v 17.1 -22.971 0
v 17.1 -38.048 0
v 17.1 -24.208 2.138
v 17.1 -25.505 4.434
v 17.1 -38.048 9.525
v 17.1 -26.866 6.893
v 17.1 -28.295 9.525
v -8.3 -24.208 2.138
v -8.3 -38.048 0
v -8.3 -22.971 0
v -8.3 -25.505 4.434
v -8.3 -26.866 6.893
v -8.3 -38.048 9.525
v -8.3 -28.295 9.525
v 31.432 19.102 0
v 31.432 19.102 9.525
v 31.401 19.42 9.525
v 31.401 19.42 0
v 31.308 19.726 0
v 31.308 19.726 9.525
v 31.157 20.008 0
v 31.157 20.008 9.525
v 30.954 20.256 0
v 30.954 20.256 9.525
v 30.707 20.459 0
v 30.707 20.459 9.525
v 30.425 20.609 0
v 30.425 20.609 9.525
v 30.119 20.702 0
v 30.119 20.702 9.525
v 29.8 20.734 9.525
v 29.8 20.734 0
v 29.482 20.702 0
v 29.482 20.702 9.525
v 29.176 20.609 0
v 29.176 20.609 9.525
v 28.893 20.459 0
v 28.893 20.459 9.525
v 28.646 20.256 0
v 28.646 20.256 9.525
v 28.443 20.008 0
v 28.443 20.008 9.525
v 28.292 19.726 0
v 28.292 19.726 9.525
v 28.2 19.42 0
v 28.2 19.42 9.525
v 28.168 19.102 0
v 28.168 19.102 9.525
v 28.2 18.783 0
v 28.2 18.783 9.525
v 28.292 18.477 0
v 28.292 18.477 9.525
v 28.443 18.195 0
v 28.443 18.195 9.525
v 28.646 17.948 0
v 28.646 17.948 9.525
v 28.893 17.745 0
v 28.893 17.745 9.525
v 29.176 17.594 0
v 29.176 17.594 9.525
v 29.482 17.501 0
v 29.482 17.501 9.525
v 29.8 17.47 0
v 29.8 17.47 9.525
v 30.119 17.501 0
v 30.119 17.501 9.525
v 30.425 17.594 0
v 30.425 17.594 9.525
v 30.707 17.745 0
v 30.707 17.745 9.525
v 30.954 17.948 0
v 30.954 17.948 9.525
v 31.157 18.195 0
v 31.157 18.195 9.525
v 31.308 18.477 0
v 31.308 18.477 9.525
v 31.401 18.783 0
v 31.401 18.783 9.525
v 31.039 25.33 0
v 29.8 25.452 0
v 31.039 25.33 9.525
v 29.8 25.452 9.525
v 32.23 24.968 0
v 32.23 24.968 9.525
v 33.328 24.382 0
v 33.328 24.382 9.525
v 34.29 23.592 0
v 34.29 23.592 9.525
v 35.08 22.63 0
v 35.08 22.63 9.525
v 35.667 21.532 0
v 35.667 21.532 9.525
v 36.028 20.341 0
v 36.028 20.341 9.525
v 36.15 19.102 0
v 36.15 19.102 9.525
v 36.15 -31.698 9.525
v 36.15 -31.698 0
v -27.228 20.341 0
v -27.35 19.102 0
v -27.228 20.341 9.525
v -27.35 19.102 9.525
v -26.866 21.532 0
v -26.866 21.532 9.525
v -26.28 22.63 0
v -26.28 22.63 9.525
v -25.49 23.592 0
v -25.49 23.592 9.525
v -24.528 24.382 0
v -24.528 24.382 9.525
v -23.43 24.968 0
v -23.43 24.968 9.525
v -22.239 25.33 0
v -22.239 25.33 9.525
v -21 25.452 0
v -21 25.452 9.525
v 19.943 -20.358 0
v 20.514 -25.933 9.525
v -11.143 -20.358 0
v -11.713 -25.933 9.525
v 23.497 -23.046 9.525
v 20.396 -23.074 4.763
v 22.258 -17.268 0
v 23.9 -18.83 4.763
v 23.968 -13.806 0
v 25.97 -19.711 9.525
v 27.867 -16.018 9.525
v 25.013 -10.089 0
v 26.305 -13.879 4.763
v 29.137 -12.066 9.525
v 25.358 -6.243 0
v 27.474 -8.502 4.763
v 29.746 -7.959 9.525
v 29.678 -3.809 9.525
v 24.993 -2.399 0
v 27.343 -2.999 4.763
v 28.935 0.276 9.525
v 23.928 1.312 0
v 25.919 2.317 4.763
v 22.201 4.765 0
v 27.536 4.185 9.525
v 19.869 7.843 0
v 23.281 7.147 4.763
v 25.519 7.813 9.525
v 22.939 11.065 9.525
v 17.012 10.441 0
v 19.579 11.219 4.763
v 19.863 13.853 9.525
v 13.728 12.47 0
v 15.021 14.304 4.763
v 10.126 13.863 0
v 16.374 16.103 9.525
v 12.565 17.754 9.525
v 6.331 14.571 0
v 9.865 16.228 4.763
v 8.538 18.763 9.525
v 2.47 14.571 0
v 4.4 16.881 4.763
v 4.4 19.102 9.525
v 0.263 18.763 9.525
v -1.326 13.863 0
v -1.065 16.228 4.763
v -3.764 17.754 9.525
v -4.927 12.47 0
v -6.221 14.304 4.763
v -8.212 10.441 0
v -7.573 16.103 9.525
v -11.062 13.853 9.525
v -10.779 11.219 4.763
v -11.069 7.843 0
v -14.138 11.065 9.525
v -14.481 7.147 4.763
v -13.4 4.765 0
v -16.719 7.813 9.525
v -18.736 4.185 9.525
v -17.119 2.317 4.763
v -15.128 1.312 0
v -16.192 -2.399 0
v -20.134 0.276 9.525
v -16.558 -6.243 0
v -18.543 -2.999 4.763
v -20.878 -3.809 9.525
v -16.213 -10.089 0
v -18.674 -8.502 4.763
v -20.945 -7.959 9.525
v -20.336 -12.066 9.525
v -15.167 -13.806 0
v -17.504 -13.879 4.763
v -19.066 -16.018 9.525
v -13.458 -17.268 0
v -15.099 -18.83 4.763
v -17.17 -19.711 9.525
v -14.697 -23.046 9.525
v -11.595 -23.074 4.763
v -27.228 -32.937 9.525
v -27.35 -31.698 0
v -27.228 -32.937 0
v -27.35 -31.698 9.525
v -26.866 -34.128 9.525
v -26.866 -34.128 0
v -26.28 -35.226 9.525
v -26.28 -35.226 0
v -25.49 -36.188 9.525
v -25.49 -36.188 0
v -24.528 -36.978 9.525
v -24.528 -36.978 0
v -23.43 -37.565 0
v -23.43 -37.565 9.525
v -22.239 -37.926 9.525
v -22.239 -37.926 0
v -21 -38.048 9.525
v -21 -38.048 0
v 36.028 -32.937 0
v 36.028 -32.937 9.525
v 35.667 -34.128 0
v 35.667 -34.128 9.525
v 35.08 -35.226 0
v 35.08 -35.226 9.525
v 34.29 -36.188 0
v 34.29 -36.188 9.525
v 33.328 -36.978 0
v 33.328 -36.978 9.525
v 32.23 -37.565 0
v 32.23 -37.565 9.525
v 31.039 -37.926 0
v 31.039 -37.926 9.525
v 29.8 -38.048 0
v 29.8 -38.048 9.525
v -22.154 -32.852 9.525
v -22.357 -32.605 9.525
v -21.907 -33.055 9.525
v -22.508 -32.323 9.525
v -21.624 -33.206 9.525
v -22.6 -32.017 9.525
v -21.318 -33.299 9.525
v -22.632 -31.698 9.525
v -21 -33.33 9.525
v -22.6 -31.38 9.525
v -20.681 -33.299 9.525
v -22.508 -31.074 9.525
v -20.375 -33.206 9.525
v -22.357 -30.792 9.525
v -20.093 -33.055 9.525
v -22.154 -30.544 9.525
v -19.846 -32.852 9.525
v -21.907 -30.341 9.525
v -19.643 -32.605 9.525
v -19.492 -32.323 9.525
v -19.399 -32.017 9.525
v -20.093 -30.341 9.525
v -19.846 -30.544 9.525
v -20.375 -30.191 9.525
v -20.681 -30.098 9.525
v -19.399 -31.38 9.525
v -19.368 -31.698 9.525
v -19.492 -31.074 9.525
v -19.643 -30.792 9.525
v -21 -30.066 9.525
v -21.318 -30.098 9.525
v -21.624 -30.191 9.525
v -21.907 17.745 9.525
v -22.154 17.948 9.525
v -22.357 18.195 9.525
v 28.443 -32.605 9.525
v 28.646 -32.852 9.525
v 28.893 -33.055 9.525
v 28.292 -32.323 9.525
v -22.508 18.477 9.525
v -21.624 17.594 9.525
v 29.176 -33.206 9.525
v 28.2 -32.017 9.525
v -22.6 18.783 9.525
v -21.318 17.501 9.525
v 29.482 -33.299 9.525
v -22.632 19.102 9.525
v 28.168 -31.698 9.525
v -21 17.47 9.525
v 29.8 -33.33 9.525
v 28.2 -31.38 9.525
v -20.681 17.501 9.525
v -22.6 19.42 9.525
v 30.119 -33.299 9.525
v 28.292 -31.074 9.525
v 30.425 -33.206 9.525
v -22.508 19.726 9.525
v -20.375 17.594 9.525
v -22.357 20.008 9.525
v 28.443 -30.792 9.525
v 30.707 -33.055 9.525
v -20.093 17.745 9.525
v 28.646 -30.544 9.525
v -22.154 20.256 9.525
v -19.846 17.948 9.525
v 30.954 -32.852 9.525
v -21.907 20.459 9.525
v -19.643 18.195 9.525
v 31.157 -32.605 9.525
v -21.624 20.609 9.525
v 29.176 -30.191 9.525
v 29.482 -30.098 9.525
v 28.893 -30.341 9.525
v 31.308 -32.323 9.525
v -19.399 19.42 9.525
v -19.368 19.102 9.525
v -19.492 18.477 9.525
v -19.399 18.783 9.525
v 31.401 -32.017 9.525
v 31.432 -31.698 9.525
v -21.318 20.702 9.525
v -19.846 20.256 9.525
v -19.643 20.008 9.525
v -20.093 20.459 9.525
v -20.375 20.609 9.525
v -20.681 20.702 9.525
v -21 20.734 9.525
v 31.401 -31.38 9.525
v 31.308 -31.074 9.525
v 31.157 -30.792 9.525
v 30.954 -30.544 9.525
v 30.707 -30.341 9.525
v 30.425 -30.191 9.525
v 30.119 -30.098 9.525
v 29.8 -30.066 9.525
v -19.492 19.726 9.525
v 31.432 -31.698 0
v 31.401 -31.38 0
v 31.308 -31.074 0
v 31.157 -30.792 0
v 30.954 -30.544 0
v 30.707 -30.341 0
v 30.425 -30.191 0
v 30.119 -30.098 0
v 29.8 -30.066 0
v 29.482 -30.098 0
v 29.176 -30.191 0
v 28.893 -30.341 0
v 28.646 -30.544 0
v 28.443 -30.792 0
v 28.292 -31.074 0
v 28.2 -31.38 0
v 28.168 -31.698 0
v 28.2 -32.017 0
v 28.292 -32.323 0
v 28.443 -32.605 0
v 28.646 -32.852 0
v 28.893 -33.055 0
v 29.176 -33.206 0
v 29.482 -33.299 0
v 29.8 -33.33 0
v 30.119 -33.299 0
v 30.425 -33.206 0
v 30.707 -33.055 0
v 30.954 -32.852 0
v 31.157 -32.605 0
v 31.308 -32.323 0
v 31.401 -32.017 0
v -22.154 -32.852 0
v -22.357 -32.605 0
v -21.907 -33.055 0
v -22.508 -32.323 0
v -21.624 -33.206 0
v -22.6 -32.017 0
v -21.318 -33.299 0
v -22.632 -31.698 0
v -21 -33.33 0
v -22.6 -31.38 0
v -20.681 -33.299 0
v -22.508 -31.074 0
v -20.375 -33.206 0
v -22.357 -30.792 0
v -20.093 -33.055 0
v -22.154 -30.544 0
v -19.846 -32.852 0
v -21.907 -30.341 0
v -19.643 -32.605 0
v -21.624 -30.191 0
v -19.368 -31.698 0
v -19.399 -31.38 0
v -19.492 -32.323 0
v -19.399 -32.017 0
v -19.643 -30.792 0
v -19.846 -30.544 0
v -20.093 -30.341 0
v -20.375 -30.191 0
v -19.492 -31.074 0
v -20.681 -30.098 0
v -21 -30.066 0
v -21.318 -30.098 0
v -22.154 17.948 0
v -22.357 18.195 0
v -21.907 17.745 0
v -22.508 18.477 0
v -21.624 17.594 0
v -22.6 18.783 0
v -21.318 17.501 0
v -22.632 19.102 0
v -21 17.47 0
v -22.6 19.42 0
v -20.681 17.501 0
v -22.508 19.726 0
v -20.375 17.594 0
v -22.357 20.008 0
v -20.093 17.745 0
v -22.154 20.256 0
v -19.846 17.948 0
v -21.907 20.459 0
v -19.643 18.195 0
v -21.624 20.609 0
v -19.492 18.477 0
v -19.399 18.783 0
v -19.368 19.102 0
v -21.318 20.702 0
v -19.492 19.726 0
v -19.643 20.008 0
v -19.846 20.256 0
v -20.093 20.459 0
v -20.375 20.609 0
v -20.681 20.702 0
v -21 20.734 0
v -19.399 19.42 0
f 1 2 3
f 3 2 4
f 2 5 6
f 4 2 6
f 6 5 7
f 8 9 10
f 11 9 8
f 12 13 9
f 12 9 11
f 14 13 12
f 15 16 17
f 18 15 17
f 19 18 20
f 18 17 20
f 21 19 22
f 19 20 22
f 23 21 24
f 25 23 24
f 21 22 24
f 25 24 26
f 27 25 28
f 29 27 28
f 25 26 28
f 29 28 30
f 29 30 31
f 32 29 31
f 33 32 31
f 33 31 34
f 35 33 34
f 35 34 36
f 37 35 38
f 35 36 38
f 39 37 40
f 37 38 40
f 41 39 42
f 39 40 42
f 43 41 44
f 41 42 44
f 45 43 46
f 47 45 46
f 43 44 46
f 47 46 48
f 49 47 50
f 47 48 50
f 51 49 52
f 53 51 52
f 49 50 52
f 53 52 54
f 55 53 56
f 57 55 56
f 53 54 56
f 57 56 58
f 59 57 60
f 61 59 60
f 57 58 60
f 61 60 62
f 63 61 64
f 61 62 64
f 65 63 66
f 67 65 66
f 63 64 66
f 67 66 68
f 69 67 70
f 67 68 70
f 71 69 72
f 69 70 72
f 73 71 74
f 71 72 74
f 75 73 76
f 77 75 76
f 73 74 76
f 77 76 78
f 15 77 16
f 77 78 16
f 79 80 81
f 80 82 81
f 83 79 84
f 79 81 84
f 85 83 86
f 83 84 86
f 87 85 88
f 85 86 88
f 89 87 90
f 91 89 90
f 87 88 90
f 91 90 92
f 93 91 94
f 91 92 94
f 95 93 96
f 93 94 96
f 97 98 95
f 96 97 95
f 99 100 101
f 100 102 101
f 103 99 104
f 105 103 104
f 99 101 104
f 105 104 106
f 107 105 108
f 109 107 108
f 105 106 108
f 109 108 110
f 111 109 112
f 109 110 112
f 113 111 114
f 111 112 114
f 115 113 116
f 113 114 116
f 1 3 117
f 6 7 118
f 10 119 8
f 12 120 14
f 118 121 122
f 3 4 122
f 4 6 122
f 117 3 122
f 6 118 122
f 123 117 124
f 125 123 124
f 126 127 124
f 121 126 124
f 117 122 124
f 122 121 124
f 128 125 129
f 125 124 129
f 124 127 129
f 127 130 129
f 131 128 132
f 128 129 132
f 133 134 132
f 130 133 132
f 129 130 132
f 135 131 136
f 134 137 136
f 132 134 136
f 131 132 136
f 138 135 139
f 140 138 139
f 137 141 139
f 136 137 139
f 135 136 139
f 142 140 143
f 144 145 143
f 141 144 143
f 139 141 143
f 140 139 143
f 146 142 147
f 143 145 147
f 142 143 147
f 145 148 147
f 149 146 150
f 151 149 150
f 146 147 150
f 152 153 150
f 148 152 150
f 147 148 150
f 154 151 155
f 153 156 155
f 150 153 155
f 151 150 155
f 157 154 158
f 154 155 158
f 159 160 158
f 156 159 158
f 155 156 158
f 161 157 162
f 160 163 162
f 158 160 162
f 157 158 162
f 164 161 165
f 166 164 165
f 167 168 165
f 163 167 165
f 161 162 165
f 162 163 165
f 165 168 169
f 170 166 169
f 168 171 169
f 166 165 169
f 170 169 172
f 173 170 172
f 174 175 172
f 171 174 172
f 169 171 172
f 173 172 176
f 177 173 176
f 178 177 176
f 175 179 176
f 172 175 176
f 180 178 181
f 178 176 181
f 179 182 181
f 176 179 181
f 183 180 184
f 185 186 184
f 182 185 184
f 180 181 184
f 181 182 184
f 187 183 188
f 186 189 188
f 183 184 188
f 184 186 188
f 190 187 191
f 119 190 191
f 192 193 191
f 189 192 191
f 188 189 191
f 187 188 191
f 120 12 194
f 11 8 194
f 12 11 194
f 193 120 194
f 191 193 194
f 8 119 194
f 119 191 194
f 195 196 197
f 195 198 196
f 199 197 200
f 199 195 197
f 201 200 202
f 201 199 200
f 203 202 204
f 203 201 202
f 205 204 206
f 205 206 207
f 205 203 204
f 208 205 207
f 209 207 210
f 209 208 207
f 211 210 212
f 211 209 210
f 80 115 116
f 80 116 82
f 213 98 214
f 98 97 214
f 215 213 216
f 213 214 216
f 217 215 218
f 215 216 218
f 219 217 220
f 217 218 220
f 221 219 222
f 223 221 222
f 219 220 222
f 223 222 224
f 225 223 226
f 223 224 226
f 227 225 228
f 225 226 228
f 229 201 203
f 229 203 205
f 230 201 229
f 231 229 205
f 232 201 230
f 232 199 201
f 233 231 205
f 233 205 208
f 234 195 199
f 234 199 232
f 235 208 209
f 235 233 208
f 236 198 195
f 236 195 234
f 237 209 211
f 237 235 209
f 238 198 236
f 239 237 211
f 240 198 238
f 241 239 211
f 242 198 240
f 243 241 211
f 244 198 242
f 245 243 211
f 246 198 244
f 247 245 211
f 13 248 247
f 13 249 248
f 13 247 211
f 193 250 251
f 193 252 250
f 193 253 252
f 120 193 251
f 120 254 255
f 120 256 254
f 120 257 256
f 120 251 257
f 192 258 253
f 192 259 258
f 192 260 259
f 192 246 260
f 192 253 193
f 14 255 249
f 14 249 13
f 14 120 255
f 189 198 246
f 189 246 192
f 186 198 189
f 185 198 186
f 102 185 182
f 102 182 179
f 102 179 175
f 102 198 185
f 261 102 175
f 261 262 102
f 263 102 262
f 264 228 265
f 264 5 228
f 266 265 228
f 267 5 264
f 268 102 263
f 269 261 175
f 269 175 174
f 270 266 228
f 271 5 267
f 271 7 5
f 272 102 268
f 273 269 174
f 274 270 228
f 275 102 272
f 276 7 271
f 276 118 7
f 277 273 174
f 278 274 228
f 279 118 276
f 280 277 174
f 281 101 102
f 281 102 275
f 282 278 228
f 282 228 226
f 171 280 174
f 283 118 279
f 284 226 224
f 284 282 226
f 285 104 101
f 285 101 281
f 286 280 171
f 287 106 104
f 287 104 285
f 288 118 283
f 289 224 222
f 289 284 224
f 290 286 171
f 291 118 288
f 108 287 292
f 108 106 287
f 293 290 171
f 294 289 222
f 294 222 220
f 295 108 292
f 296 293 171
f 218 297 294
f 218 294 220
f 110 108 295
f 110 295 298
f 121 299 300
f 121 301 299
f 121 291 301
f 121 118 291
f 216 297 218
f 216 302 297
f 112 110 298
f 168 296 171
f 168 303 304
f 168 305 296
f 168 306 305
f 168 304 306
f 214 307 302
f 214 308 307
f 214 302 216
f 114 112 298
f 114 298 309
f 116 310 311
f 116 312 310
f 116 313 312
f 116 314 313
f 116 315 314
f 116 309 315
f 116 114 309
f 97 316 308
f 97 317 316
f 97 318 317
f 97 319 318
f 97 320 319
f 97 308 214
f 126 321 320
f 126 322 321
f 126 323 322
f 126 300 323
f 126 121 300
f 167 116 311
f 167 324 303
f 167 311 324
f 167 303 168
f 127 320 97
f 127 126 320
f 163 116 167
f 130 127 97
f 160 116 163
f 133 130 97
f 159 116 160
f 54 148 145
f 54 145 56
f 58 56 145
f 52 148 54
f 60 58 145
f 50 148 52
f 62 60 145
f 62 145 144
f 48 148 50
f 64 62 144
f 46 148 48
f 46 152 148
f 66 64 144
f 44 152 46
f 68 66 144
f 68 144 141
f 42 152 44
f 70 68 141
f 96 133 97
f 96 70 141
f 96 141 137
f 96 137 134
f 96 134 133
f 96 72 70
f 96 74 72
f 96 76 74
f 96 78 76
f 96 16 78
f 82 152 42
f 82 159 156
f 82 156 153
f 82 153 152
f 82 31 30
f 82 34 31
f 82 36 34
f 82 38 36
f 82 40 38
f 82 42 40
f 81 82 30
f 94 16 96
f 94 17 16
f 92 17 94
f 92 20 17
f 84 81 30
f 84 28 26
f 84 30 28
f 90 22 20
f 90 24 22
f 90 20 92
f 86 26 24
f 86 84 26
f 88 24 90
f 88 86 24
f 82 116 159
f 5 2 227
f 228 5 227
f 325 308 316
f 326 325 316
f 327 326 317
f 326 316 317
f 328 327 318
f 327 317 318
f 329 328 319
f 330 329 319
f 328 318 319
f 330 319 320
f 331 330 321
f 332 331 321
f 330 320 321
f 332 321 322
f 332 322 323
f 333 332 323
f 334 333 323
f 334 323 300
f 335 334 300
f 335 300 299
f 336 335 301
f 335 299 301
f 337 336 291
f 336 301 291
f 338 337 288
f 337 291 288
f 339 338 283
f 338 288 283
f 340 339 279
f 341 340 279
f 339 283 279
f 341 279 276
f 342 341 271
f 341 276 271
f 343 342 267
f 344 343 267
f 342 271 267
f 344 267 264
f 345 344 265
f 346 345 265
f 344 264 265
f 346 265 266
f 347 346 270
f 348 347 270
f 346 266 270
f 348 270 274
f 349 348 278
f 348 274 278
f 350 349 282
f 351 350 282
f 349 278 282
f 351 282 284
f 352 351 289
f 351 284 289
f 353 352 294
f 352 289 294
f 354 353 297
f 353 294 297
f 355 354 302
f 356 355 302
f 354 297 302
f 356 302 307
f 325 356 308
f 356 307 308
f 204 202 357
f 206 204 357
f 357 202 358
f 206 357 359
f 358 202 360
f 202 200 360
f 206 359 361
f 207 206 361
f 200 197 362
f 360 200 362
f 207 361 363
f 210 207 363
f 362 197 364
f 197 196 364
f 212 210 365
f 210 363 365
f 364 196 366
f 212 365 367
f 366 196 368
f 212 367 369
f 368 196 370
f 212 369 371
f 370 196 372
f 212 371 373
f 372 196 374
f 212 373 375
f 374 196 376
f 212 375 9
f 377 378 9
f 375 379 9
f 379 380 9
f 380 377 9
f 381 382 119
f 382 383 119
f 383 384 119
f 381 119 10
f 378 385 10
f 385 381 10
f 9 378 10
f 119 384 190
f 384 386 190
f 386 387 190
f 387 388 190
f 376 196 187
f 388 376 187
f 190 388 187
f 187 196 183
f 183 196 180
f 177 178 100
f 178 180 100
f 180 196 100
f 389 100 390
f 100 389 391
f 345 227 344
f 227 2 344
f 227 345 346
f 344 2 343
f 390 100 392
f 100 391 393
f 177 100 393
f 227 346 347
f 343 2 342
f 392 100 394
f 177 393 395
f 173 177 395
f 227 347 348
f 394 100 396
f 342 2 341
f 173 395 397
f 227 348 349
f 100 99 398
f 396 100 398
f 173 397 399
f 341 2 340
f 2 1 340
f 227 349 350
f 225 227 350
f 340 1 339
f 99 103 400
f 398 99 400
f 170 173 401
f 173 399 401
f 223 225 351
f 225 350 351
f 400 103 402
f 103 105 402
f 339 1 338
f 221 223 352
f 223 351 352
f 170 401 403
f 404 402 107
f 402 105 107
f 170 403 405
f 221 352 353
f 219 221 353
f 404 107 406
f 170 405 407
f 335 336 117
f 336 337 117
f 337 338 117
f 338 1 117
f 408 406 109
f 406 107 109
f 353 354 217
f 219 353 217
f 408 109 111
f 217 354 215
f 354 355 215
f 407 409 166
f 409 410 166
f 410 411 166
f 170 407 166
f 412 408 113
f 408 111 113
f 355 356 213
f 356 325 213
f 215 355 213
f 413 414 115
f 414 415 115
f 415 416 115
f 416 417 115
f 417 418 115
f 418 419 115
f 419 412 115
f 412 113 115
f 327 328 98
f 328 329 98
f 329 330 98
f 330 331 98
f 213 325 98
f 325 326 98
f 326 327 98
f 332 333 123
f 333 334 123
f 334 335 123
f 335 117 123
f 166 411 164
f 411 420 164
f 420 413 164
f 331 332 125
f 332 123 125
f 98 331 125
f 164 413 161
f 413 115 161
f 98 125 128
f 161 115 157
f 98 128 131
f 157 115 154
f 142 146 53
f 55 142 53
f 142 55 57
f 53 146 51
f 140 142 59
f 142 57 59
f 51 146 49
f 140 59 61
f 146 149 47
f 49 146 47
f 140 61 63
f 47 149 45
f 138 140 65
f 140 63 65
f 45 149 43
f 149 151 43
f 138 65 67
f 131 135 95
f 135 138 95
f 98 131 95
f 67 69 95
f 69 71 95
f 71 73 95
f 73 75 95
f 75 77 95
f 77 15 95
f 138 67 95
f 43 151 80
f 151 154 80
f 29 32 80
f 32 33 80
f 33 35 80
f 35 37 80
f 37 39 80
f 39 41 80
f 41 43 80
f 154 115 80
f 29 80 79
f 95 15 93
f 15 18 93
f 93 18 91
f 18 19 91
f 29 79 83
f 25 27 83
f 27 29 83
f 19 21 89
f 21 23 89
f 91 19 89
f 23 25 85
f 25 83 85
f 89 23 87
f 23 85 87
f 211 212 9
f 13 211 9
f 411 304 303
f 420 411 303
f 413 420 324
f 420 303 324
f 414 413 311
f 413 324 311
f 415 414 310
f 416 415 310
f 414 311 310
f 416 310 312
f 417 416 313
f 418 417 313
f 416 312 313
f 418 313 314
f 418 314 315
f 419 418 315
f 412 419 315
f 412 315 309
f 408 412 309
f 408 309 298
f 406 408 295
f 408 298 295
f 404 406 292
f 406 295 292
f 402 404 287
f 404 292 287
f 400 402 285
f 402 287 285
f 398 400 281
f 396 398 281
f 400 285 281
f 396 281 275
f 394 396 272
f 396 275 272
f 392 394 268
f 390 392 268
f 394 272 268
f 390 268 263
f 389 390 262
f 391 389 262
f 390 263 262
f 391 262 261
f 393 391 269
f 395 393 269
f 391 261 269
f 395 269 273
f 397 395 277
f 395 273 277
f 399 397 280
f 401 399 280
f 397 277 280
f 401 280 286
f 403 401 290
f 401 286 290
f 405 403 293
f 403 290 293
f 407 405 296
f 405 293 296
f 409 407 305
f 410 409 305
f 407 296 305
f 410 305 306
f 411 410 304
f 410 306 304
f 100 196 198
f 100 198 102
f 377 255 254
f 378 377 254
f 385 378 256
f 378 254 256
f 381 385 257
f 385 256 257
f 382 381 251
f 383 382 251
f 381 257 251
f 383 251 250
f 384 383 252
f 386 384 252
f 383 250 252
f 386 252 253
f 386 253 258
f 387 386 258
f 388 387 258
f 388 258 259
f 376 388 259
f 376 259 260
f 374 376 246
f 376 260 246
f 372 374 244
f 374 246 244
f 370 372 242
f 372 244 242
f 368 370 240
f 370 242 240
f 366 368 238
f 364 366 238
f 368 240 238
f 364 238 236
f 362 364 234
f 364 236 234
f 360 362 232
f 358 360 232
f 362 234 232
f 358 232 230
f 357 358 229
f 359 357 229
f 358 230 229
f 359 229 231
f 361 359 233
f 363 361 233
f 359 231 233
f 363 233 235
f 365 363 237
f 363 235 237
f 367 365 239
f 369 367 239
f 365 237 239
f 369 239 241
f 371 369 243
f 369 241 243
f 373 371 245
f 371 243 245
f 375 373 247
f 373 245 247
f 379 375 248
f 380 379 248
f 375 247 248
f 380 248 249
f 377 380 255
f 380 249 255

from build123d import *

# Parameters (mm, degrees)
SKETCH1_W           = 63.5
SKETCH1_H           = 63.5
BOSS_EXTRUDE1_DEPTH = 9.525
SKETCH2_R           = 25.4
CUT_EXTRUDE1_DEPTH  = 12.7
CUT_EXTRUDE1_DRAFT  = -25
SKETCH3_W           = 25.4
SKETCH3_H           = 28.786668085
CUT_EXTRUDE2_DEPTH  = 9.525
SKETCH4_R           = 1.63195
CUT_EXTRUDE3_DEPTH  = 9.525
FILLET1_R           = 6.35
FILLET2_R           = 6.35


with BuildPart() as part:
    # Sketch1 → Boss-Extrude1 (new body)
    with BuildSketch(Plane.XY):
        with Locations((4.40013587, -6.298233696)):
            Rectangle(SKETCH1_W, SKETCH1_H)
    extrude(amount=BOSS_EXTRUDE1_DEPTH)


with BuildPart() as cut_extrude1_tool:
    # Sketch2 → Cut-Extrude1 (with draft: the straight prism first)
    with BuildSketch(Plane.XY.offset(9.525)):
        with Locations((4.40013587, -6.298233696)):
            Circle(SKETCH2_R)
    extrude(amount=-CUT_EXTRUDE1_DEPTH)
    # Cut-Extrude1: the draft: its side faces are tilted about the plane it starts from
    cut_extrude1_sides = [cut_extrude1_tool.faces().sort_by_distance(p)[0] for p in [
        (-20.99986413, -6.298233696, 3.175),
    ]]
    draft(cut_extrude1_sides, Plane.XY.offset(9.525), CUT_EXTRUDE1_DRAFT)


with BuildPart() as part_1:
    add(part.part)

    # Cut-Extrude1: cut by cut_extrude1_tool
    add(cut_extrude1_tool.part, mode=Mode.SUBTRACT)

    # Sketch3 → Cut-Extrude2 (cut)
    with BuildSketch(Plane.XY.offset(9.525)):
        with Locations((4.40013587, -23.654899654)):
            Rectangle(SKETCH3_W, SKETCH3_H)
    extrude(amount=-CUT_EXTRUDE2_DEPTH, mode=Mode.SUBTRACT)

    # Sketch4 → Cut-Extrude3 (cut)
    with BuildSketch(Plane.XY.offset(9.525)):
        with Locations((-20.99986413, 19.101766304)):
            Circle(SKETCH4_R)
        with Locations((29.80013587, 19.101766304)):
            Circle(SKETCH4_R)
        with Locations((29.80013587, -31.698233696)):
            Circle(SKETCH4_R)
        with Locations((-20.99986413, -31.698233696)):
            Circle(SKETCH4_R)
    extrude(amount=-CUT_EXTRUDE3_DEPTH, mode=Mode.SUBTRACT)

    # Fillet1
    fillet1_edges = [part_1.edges().sort_by_distance(p)[0] for p in [
        (-27.34986413, 25.451766304, 4.7625),
        (36.15013587, 25.451766304, 4.7625),
        (-27.34986413, -38.048233696, 4.7625),
    ]]
    fillet(fillet1_edges, radius=FILLET1_R)

    # Fillet2
    fillet2_edges = [part_1.edges().sort_by_distance(p)[0] for p in [
        (36.15013587, -38.048233696, 4.7625),
    ]]
    fillet(fillet2_edges, radius=FILLET2_R)


solid = part_1.part
